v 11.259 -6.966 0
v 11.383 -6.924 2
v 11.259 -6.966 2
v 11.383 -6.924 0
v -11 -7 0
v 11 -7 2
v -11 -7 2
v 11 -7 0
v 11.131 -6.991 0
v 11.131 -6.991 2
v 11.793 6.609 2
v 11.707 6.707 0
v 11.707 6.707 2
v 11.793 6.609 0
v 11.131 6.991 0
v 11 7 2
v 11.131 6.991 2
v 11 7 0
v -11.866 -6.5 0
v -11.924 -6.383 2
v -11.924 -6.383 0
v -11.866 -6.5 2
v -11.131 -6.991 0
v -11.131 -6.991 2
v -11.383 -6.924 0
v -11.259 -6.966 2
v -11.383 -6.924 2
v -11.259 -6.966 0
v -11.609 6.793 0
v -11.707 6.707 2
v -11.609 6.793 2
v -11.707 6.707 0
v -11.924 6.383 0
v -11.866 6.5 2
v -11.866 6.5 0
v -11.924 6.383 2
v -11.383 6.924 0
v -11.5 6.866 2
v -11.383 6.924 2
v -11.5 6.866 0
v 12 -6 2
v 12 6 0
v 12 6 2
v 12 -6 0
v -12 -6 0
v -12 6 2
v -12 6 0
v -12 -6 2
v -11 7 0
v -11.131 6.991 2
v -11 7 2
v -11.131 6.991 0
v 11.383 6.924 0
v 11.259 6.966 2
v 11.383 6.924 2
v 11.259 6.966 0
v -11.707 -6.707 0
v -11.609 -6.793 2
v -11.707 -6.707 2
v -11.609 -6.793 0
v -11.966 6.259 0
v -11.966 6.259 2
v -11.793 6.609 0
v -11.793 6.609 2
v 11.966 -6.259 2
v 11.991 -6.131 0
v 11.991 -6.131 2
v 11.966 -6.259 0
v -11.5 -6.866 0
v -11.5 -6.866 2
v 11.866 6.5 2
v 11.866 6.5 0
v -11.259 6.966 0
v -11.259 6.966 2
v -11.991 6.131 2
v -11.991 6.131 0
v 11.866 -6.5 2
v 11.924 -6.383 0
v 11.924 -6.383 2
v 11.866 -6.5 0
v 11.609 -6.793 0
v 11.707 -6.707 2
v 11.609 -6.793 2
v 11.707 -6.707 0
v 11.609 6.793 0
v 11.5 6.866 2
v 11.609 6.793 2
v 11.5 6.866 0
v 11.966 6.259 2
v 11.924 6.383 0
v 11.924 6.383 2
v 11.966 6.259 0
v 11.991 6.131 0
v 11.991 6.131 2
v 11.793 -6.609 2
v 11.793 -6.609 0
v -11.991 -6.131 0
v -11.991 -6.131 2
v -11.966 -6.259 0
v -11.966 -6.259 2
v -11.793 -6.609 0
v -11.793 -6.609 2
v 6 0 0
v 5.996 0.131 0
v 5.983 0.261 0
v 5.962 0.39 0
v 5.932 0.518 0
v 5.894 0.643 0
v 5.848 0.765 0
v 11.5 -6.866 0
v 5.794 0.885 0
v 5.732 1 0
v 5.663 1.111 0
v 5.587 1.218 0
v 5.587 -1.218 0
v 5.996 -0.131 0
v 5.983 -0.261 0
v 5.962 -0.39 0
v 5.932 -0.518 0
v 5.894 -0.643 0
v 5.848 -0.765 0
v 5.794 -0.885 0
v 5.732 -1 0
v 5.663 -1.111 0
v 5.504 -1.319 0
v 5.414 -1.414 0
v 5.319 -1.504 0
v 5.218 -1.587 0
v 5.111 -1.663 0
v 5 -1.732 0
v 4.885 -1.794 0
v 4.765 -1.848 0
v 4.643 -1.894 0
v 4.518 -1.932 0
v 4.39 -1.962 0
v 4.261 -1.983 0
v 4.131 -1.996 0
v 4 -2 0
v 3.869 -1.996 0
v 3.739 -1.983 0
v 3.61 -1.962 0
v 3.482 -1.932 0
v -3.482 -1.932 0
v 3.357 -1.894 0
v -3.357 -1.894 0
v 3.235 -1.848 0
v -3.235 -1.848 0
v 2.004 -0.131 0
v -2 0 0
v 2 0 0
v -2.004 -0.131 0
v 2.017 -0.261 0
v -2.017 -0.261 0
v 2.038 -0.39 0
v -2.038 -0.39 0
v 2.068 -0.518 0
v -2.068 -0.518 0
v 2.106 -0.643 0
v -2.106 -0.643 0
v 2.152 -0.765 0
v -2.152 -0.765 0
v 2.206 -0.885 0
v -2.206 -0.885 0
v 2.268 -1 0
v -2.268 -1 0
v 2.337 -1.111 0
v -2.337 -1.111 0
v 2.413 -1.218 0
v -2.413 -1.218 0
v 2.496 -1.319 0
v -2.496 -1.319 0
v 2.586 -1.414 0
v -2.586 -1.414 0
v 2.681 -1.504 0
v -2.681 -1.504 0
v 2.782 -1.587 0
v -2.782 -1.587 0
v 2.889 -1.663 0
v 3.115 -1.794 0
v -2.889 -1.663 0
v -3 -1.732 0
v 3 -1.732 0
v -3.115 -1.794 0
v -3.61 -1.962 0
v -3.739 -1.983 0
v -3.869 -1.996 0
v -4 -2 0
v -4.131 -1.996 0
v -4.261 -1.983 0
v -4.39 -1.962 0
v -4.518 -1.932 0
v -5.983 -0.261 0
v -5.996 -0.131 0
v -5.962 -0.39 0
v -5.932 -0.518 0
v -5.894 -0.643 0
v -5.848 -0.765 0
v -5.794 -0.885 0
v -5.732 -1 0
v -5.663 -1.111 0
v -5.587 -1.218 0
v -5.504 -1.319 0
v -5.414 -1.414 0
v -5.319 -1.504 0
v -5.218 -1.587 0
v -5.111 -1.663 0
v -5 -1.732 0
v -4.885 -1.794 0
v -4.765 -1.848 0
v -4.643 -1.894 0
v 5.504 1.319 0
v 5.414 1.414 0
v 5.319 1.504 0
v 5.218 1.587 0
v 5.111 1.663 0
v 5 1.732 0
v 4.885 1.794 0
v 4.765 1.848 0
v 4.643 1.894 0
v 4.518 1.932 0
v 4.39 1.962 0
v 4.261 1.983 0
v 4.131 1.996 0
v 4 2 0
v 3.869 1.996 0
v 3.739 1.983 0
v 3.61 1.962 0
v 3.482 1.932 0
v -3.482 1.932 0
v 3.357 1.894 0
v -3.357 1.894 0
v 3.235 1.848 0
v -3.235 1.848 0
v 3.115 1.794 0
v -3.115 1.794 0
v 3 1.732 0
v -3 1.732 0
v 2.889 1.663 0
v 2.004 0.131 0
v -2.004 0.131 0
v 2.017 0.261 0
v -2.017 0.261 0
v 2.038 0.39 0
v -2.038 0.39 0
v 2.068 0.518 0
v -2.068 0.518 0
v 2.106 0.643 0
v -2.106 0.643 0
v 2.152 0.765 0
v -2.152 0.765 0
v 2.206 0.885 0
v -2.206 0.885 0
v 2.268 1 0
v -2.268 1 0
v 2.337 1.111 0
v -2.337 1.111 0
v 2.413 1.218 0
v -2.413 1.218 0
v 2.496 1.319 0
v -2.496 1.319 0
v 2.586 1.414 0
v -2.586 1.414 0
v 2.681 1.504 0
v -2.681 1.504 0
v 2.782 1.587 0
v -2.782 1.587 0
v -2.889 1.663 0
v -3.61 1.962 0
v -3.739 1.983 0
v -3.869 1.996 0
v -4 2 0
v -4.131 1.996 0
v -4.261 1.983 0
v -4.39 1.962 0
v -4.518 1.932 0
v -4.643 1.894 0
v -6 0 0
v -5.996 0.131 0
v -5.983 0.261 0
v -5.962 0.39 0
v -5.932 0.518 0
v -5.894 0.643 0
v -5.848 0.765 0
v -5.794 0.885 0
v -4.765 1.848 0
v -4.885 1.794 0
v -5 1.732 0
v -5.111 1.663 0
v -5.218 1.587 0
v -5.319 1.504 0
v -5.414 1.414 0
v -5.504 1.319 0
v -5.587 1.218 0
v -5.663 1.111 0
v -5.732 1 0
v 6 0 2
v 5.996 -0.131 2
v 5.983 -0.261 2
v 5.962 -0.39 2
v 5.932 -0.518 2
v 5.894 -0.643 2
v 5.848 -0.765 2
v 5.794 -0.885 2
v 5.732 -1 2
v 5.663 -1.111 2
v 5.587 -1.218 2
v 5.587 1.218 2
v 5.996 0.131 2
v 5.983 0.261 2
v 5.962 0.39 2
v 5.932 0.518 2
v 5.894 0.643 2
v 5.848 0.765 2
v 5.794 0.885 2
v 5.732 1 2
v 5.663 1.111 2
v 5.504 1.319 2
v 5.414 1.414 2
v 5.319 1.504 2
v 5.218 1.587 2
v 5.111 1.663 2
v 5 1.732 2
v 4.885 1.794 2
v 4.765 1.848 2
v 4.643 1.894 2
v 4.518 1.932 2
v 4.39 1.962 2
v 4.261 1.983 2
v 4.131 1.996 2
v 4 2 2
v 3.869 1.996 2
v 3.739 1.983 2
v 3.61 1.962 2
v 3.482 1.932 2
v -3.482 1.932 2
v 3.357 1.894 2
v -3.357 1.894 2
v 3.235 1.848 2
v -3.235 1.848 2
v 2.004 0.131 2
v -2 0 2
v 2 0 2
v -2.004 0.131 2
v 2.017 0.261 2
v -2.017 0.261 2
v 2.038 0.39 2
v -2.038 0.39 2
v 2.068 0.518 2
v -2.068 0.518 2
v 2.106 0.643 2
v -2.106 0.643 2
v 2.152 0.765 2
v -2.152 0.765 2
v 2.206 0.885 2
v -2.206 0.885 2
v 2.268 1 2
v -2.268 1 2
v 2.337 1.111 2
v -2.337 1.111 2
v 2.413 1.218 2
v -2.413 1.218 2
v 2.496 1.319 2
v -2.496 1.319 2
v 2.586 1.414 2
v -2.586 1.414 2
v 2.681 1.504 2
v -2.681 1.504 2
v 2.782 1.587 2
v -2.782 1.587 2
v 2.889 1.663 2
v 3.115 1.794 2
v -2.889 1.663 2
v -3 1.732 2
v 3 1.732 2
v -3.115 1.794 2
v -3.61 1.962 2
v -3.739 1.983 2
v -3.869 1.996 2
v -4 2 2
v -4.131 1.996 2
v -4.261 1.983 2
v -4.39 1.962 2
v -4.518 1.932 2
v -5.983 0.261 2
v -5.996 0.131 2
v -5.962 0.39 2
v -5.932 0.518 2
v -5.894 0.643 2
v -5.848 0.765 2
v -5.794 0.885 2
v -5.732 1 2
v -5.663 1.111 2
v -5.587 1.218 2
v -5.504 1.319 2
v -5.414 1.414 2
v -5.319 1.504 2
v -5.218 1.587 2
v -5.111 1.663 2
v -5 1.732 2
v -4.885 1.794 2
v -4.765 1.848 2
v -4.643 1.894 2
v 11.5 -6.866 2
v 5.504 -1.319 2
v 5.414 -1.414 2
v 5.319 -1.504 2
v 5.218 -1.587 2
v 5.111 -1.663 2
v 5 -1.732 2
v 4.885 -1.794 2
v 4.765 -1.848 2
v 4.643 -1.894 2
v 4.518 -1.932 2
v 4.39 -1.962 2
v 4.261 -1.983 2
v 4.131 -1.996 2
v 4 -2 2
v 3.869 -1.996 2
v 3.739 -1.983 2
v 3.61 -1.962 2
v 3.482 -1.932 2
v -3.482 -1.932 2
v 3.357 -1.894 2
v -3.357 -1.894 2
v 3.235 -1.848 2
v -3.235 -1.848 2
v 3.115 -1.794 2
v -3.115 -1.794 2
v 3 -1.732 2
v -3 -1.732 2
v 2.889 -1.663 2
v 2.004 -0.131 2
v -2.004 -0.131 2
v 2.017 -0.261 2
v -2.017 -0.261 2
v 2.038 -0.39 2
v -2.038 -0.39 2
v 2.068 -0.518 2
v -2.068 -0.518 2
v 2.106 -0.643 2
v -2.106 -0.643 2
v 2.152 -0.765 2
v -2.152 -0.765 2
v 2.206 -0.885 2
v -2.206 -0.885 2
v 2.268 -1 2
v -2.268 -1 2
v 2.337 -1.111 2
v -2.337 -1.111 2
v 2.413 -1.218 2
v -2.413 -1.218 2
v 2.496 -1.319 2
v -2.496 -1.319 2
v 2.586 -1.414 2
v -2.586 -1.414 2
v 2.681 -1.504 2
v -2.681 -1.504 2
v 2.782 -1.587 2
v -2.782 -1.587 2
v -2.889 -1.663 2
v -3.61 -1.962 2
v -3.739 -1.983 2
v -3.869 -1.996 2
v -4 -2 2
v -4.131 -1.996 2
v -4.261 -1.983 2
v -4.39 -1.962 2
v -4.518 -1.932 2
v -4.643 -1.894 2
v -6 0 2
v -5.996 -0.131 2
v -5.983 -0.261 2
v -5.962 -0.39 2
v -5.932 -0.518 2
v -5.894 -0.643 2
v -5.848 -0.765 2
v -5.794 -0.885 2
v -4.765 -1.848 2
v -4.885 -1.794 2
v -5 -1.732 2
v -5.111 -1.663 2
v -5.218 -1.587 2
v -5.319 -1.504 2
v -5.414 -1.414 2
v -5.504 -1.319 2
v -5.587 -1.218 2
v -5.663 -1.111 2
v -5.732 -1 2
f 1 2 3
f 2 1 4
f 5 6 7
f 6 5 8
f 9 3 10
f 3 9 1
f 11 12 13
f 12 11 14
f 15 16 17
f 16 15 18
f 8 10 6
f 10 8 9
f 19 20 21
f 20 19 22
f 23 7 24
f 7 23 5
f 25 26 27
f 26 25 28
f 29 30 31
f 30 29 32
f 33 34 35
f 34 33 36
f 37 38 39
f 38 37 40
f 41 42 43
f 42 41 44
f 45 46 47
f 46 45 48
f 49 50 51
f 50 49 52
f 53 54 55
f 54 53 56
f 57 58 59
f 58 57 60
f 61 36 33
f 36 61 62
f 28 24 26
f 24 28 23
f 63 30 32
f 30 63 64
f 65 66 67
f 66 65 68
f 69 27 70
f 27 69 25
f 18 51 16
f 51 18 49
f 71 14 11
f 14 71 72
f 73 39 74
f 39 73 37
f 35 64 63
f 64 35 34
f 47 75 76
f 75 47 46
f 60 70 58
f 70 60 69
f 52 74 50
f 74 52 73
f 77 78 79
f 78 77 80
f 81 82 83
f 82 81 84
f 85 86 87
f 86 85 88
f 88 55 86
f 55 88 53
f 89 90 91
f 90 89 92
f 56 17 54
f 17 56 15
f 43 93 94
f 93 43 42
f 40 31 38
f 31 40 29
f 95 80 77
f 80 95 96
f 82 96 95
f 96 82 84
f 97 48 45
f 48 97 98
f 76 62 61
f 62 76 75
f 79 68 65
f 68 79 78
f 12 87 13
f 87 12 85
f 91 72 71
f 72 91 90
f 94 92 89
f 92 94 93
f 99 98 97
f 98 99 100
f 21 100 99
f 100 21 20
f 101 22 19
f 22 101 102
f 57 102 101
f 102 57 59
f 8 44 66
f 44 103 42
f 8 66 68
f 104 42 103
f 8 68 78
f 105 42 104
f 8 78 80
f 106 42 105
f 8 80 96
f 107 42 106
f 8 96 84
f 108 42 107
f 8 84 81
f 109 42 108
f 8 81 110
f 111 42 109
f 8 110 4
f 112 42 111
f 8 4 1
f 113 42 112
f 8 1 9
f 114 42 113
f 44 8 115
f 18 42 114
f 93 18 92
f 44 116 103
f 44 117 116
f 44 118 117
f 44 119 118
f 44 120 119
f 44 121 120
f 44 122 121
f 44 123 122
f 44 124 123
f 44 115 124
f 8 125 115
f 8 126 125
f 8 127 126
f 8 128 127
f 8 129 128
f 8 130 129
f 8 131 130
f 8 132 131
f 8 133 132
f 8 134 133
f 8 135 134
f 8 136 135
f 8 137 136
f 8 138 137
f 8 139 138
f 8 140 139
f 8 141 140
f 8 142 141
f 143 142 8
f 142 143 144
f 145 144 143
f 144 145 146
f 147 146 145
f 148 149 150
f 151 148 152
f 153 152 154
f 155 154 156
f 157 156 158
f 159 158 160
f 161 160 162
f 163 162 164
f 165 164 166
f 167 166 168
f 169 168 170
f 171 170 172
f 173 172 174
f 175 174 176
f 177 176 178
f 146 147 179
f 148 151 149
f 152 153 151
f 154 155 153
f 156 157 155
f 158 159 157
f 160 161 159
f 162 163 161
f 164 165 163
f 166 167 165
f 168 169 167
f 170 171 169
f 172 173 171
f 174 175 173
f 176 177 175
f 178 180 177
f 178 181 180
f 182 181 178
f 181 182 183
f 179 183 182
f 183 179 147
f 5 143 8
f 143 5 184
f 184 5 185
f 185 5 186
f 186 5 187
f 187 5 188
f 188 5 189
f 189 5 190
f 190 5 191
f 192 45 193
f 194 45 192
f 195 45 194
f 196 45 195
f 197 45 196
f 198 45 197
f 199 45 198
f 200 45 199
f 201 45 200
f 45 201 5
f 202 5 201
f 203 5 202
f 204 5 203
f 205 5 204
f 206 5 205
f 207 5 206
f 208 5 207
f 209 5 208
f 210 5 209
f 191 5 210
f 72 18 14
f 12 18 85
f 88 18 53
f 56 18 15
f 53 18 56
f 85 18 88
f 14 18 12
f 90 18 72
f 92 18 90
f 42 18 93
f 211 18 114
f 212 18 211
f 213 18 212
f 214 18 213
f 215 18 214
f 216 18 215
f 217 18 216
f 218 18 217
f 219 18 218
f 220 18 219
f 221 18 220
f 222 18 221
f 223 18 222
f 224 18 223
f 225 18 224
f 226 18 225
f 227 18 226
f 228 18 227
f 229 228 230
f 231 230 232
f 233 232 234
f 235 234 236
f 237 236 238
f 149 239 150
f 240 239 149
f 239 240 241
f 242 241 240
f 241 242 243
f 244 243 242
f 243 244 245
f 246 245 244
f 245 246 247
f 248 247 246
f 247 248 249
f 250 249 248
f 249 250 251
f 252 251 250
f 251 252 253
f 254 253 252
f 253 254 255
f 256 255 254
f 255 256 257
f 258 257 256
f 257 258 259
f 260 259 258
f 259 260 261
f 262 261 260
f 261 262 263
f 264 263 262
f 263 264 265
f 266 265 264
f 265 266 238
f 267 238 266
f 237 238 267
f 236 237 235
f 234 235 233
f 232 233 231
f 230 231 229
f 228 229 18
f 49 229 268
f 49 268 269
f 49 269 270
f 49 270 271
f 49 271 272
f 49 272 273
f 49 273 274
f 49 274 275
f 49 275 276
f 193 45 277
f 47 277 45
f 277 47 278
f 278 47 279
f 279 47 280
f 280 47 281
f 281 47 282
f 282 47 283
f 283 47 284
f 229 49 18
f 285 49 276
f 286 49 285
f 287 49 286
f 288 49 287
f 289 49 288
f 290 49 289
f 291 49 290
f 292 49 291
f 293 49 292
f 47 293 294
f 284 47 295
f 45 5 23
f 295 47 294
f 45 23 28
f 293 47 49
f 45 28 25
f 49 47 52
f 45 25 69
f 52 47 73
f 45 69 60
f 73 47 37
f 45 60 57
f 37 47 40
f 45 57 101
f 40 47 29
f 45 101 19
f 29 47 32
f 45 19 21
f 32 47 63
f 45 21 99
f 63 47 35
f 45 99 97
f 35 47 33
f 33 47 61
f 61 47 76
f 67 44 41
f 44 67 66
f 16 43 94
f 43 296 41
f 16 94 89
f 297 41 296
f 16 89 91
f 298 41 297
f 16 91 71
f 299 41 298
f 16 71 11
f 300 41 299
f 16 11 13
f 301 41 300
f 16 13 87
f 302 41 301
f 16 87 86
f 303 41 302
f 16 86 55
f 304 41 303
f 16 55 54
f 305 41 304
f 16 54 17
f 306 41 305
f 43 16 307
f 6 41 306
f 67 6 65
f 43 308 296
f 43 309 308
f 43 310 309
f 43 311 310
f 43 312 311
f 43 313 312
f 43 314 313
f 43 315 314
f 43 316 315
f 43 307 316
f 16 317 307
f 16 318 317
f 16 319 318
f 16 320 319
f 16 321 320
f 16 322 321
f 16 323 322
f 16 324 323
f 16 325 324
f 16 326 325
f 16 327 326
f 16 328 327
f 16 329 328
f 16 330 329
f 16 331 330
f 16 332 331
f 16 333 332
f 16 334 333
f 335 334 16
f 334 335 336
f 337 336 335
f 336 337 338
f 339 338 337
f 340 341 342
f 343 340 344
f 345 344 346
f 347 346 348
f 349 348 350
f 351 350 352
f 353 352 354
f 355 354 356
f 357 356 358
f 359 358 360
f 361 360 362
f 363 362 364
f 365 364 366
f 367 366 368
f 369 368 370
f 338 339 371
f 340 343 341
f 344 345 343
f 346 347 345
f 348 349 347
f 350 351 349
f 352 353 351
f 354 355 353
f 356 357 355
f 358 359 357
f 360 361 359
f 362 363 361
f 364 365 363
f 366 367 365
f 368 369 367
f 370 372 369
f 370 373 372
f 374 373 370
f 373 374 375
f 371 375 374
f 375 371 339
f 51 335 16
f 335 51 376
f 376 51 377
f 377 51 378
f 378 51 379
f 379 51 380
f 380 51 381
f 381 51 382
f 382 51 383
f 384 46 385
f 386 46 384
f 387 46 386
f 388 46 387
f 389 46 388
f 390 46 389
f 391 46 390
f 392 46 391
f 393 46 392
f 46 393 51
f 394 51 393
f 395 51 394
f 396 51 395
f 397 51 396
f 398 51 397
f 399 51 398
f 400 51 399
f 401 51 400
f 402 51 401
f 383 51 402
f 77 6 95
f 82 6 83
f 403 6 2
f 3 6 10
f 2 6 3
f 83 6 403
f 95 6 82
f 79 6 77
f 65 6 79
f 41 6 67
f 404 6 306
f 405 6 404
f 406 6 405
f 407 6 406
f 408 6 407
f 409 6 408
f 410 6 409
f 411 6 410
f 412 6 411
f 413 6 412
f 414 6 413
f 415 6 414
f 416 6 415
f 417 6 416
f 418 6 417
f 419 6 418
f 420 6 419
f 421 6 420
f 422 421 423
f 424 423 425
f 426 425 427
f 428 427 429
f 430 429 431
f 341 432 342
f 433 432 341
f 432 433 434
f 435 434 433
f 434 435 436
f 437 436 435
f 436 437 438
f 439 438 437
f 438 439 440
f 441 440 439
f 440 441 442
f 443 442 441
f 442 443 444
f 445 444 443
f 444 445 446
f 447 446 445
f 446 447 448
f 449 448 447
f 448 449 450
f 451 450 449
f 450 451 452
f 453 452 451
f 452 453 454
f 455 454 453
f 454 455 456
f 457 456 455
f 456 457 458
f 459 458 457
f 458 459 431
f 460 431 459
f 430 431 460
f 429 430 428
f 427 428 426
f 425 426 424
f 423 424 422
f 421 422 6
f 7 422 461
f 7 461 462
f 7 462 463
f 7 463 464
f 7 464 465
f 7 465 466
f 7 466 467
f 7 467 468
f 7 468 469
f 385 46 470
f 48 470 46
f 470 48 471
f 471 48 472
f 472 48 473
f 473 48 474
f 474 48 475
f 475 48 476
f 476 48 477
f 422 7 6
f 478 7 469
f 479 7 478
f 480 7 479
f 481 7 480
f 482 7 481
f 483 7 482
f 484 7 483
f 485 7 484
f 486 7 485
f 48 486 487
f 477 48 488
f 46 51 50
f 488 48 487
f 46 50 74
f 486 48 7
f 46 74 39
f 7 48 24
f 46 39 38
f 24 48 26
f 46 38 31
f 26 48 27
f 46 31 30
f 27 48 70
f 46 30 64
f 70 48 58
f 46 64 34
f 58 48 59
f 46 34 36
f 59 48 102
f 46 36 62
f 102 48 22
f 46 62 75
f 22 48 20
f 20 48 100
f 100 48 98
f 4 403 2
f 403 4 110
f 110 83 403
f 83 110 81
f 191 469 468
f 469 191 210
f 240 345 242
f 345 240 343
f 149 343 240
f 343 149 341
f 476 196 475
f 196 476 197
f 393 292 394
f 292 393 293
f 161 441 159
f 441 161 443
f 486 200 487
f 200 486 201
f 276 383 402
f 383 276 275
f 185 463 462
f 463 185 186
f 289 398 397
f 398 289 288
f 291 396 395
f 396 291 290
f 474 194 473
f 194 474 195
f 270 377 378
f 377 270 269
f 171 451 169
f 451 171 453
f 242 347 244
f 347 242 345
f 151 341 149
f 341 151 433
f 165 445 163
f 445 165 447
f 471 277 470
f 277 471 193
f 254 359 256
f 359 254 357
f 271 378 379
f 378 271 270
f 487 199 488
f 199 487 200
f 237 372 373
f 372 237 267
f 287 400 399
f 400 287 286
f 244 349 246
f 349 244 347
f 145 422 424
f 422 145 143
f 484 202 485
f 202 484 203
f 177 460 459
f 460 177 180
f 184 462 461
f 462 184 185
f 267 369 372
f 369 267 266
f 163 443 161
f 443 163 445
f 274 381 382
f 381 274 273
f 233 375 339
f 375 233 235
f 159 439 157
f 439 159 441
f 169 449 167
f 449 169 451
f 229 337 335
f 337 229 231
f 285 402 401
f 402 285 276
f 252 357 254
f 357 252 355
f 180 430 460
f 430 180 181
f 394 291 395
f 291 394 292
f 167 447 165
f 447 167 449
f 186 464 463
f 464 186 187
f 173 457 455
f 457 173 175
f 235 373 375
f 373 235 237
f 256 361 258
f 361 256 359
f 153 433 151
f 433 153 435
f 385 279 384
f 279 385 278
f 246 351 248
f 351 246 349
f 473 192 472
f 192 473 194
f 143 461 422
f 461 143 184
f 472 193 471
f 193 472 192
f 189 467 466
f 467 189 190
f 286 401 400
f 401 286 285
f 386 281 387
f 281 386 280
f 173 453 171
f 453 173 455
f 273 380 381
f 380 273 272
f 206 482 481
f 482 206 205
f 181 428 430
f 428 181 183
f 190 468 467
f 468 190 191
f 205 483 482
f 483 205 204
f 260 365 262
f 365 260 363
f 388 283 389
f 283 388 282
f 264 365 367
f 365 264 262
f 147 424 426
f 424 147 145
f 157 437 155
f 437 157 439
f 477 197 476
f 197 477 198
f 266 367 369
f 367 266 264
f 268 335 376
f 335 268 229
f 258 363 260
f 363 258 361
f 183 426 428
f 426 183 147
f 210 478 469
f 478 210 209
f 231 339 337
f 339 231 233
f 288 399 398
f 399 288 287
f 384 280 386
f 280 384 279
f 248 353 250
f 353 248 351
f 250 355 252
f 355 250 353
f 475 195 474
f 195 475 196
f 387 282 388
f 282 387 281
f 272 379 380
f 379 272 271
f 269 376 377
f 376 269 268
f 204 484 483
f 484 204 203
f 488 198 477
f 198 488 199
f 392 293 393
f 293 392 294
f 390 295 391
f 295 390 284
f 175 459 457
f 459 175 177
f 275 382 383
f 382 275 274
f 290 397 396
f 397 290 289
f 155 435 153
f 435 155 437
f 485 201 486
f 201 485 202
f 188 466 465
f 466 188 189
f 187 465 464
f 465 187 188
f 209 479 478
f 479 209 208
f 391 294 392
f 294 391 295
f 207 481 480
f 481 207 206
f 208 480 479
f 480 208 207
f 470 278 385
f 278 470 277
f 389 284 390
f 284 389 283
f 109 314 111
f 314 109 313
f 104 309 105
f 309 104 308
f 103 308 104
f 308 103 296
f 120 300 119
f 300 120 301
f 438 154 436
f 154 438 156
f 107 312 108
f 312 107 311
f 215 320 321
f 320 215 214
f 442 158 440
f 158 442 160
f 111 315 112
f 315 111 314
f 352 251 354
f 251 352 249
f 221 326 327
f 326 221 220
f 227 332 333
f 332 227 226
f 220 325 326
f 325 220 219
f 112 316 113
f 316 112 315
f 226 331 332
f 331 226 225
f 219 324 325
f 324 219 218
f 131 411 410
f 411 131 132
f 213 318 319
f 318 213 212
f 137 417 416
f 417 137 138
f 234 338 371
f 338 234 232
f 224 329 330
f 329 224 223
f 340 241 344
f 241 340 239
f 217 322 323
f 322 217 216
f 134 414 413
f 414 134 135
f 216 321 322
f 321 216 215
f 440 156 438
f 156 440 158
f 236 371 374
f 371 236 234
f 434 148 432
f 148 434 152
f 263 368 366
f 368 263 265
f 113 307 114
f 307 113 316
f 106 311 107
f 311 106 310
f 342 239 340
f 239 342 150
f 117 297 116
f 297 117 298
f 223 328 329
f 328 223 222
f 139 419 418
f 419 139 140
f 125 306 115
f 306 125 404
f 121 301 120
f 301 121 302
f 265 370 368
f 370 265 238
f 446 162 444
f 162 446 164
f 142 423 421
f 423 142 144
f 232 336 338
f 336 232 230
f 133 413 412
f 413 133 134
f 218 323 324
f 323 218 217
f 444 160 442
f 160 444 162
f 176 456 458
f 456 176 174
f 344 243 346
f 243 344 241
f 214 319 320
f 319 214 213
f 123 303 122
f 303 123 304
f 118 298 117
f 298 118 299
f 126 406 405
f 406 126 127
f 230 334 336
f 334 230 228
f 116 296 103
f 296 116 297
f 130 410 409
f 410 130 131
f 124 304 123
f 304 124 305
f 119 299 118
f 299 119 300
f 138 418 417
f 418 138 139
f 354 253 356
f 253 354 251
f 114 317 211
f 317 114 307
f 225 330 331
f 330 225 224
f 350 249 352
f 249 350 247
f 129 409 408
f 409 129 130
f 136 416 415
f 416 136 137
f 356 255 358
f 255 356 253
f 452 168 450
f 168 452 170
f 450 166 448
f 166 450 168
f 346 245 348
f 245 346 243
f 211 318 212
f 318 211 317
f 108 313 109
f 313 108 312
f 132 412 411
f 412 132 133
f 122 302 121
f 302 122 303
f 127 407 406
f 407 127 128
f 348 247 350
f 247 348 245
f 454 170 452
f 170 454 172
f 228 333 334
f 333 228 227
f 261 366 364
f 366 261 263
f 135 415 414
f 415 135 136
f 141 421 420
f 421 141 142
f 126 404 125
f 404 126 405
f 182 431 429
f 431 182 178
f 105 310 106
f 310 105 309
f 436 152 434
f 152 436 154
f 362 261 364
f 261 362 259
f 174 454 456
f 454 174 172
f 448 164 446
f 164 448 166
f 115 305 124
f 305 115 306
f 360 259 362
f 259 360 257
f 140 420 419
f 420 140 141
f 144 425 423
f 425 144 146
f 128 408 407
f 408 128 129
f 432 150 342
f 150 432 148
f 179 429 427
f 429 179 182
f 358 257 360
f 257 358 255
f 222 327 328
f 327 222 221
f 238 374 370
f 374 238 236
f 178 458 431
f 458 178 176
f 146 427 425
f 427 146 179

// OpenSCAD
// Auto-generated from tests/data/feature_fixtures_manifest.json
// fixture: plate_filleted_linear_holes
// fixture_type: plate
// description: Filleted-edge plate with a two-hole linear pattern, combining edge fillet with repeated holes on a single plate.
$fn = 96;

plate_size = [24.000000, 14.000000, 2.000000];
plate_origin = [-12.000000, -7.000000, 0.000000];

module through_hole(center, diameter, height) {
  translate(center) cylinder(d=diameter, h=height, center=false);
}

module through_slot(start, end, width, height) {
  hull() {
    through_hole(start, width, height);
    through_hole(end, width, height);
  }
}

module counterbore_hole(center, through_d, bore_d, bore_depth, plate_thickness) {
  translate([center[0], center[1], -0.1])
    cylinder(d=through_d, h=plate_thickness + 0.2, center=false);
  translate([center[0], center[1], plate_thickness - bore_depth])
    cylinder(d=bore_d, h=bore_depth + 0.1, center=false);
}

plate_edge_radius = 1.000000;
plate_inner_square = [22.000000, 12.000000];

difference() {
  linear_extrude(height=plate_size[2]) offset(r=plate_edge_radius, $fn=48) square(plate_inner_square, center=true);
  through_hole([-4.000000, 0.000000, -0.100000], 4.000000, 2.200000);  // hole_0
  through_hole([4.000000, 0.000000, -0.100000], 4.000000, 2.200000);  // hole_1
}
